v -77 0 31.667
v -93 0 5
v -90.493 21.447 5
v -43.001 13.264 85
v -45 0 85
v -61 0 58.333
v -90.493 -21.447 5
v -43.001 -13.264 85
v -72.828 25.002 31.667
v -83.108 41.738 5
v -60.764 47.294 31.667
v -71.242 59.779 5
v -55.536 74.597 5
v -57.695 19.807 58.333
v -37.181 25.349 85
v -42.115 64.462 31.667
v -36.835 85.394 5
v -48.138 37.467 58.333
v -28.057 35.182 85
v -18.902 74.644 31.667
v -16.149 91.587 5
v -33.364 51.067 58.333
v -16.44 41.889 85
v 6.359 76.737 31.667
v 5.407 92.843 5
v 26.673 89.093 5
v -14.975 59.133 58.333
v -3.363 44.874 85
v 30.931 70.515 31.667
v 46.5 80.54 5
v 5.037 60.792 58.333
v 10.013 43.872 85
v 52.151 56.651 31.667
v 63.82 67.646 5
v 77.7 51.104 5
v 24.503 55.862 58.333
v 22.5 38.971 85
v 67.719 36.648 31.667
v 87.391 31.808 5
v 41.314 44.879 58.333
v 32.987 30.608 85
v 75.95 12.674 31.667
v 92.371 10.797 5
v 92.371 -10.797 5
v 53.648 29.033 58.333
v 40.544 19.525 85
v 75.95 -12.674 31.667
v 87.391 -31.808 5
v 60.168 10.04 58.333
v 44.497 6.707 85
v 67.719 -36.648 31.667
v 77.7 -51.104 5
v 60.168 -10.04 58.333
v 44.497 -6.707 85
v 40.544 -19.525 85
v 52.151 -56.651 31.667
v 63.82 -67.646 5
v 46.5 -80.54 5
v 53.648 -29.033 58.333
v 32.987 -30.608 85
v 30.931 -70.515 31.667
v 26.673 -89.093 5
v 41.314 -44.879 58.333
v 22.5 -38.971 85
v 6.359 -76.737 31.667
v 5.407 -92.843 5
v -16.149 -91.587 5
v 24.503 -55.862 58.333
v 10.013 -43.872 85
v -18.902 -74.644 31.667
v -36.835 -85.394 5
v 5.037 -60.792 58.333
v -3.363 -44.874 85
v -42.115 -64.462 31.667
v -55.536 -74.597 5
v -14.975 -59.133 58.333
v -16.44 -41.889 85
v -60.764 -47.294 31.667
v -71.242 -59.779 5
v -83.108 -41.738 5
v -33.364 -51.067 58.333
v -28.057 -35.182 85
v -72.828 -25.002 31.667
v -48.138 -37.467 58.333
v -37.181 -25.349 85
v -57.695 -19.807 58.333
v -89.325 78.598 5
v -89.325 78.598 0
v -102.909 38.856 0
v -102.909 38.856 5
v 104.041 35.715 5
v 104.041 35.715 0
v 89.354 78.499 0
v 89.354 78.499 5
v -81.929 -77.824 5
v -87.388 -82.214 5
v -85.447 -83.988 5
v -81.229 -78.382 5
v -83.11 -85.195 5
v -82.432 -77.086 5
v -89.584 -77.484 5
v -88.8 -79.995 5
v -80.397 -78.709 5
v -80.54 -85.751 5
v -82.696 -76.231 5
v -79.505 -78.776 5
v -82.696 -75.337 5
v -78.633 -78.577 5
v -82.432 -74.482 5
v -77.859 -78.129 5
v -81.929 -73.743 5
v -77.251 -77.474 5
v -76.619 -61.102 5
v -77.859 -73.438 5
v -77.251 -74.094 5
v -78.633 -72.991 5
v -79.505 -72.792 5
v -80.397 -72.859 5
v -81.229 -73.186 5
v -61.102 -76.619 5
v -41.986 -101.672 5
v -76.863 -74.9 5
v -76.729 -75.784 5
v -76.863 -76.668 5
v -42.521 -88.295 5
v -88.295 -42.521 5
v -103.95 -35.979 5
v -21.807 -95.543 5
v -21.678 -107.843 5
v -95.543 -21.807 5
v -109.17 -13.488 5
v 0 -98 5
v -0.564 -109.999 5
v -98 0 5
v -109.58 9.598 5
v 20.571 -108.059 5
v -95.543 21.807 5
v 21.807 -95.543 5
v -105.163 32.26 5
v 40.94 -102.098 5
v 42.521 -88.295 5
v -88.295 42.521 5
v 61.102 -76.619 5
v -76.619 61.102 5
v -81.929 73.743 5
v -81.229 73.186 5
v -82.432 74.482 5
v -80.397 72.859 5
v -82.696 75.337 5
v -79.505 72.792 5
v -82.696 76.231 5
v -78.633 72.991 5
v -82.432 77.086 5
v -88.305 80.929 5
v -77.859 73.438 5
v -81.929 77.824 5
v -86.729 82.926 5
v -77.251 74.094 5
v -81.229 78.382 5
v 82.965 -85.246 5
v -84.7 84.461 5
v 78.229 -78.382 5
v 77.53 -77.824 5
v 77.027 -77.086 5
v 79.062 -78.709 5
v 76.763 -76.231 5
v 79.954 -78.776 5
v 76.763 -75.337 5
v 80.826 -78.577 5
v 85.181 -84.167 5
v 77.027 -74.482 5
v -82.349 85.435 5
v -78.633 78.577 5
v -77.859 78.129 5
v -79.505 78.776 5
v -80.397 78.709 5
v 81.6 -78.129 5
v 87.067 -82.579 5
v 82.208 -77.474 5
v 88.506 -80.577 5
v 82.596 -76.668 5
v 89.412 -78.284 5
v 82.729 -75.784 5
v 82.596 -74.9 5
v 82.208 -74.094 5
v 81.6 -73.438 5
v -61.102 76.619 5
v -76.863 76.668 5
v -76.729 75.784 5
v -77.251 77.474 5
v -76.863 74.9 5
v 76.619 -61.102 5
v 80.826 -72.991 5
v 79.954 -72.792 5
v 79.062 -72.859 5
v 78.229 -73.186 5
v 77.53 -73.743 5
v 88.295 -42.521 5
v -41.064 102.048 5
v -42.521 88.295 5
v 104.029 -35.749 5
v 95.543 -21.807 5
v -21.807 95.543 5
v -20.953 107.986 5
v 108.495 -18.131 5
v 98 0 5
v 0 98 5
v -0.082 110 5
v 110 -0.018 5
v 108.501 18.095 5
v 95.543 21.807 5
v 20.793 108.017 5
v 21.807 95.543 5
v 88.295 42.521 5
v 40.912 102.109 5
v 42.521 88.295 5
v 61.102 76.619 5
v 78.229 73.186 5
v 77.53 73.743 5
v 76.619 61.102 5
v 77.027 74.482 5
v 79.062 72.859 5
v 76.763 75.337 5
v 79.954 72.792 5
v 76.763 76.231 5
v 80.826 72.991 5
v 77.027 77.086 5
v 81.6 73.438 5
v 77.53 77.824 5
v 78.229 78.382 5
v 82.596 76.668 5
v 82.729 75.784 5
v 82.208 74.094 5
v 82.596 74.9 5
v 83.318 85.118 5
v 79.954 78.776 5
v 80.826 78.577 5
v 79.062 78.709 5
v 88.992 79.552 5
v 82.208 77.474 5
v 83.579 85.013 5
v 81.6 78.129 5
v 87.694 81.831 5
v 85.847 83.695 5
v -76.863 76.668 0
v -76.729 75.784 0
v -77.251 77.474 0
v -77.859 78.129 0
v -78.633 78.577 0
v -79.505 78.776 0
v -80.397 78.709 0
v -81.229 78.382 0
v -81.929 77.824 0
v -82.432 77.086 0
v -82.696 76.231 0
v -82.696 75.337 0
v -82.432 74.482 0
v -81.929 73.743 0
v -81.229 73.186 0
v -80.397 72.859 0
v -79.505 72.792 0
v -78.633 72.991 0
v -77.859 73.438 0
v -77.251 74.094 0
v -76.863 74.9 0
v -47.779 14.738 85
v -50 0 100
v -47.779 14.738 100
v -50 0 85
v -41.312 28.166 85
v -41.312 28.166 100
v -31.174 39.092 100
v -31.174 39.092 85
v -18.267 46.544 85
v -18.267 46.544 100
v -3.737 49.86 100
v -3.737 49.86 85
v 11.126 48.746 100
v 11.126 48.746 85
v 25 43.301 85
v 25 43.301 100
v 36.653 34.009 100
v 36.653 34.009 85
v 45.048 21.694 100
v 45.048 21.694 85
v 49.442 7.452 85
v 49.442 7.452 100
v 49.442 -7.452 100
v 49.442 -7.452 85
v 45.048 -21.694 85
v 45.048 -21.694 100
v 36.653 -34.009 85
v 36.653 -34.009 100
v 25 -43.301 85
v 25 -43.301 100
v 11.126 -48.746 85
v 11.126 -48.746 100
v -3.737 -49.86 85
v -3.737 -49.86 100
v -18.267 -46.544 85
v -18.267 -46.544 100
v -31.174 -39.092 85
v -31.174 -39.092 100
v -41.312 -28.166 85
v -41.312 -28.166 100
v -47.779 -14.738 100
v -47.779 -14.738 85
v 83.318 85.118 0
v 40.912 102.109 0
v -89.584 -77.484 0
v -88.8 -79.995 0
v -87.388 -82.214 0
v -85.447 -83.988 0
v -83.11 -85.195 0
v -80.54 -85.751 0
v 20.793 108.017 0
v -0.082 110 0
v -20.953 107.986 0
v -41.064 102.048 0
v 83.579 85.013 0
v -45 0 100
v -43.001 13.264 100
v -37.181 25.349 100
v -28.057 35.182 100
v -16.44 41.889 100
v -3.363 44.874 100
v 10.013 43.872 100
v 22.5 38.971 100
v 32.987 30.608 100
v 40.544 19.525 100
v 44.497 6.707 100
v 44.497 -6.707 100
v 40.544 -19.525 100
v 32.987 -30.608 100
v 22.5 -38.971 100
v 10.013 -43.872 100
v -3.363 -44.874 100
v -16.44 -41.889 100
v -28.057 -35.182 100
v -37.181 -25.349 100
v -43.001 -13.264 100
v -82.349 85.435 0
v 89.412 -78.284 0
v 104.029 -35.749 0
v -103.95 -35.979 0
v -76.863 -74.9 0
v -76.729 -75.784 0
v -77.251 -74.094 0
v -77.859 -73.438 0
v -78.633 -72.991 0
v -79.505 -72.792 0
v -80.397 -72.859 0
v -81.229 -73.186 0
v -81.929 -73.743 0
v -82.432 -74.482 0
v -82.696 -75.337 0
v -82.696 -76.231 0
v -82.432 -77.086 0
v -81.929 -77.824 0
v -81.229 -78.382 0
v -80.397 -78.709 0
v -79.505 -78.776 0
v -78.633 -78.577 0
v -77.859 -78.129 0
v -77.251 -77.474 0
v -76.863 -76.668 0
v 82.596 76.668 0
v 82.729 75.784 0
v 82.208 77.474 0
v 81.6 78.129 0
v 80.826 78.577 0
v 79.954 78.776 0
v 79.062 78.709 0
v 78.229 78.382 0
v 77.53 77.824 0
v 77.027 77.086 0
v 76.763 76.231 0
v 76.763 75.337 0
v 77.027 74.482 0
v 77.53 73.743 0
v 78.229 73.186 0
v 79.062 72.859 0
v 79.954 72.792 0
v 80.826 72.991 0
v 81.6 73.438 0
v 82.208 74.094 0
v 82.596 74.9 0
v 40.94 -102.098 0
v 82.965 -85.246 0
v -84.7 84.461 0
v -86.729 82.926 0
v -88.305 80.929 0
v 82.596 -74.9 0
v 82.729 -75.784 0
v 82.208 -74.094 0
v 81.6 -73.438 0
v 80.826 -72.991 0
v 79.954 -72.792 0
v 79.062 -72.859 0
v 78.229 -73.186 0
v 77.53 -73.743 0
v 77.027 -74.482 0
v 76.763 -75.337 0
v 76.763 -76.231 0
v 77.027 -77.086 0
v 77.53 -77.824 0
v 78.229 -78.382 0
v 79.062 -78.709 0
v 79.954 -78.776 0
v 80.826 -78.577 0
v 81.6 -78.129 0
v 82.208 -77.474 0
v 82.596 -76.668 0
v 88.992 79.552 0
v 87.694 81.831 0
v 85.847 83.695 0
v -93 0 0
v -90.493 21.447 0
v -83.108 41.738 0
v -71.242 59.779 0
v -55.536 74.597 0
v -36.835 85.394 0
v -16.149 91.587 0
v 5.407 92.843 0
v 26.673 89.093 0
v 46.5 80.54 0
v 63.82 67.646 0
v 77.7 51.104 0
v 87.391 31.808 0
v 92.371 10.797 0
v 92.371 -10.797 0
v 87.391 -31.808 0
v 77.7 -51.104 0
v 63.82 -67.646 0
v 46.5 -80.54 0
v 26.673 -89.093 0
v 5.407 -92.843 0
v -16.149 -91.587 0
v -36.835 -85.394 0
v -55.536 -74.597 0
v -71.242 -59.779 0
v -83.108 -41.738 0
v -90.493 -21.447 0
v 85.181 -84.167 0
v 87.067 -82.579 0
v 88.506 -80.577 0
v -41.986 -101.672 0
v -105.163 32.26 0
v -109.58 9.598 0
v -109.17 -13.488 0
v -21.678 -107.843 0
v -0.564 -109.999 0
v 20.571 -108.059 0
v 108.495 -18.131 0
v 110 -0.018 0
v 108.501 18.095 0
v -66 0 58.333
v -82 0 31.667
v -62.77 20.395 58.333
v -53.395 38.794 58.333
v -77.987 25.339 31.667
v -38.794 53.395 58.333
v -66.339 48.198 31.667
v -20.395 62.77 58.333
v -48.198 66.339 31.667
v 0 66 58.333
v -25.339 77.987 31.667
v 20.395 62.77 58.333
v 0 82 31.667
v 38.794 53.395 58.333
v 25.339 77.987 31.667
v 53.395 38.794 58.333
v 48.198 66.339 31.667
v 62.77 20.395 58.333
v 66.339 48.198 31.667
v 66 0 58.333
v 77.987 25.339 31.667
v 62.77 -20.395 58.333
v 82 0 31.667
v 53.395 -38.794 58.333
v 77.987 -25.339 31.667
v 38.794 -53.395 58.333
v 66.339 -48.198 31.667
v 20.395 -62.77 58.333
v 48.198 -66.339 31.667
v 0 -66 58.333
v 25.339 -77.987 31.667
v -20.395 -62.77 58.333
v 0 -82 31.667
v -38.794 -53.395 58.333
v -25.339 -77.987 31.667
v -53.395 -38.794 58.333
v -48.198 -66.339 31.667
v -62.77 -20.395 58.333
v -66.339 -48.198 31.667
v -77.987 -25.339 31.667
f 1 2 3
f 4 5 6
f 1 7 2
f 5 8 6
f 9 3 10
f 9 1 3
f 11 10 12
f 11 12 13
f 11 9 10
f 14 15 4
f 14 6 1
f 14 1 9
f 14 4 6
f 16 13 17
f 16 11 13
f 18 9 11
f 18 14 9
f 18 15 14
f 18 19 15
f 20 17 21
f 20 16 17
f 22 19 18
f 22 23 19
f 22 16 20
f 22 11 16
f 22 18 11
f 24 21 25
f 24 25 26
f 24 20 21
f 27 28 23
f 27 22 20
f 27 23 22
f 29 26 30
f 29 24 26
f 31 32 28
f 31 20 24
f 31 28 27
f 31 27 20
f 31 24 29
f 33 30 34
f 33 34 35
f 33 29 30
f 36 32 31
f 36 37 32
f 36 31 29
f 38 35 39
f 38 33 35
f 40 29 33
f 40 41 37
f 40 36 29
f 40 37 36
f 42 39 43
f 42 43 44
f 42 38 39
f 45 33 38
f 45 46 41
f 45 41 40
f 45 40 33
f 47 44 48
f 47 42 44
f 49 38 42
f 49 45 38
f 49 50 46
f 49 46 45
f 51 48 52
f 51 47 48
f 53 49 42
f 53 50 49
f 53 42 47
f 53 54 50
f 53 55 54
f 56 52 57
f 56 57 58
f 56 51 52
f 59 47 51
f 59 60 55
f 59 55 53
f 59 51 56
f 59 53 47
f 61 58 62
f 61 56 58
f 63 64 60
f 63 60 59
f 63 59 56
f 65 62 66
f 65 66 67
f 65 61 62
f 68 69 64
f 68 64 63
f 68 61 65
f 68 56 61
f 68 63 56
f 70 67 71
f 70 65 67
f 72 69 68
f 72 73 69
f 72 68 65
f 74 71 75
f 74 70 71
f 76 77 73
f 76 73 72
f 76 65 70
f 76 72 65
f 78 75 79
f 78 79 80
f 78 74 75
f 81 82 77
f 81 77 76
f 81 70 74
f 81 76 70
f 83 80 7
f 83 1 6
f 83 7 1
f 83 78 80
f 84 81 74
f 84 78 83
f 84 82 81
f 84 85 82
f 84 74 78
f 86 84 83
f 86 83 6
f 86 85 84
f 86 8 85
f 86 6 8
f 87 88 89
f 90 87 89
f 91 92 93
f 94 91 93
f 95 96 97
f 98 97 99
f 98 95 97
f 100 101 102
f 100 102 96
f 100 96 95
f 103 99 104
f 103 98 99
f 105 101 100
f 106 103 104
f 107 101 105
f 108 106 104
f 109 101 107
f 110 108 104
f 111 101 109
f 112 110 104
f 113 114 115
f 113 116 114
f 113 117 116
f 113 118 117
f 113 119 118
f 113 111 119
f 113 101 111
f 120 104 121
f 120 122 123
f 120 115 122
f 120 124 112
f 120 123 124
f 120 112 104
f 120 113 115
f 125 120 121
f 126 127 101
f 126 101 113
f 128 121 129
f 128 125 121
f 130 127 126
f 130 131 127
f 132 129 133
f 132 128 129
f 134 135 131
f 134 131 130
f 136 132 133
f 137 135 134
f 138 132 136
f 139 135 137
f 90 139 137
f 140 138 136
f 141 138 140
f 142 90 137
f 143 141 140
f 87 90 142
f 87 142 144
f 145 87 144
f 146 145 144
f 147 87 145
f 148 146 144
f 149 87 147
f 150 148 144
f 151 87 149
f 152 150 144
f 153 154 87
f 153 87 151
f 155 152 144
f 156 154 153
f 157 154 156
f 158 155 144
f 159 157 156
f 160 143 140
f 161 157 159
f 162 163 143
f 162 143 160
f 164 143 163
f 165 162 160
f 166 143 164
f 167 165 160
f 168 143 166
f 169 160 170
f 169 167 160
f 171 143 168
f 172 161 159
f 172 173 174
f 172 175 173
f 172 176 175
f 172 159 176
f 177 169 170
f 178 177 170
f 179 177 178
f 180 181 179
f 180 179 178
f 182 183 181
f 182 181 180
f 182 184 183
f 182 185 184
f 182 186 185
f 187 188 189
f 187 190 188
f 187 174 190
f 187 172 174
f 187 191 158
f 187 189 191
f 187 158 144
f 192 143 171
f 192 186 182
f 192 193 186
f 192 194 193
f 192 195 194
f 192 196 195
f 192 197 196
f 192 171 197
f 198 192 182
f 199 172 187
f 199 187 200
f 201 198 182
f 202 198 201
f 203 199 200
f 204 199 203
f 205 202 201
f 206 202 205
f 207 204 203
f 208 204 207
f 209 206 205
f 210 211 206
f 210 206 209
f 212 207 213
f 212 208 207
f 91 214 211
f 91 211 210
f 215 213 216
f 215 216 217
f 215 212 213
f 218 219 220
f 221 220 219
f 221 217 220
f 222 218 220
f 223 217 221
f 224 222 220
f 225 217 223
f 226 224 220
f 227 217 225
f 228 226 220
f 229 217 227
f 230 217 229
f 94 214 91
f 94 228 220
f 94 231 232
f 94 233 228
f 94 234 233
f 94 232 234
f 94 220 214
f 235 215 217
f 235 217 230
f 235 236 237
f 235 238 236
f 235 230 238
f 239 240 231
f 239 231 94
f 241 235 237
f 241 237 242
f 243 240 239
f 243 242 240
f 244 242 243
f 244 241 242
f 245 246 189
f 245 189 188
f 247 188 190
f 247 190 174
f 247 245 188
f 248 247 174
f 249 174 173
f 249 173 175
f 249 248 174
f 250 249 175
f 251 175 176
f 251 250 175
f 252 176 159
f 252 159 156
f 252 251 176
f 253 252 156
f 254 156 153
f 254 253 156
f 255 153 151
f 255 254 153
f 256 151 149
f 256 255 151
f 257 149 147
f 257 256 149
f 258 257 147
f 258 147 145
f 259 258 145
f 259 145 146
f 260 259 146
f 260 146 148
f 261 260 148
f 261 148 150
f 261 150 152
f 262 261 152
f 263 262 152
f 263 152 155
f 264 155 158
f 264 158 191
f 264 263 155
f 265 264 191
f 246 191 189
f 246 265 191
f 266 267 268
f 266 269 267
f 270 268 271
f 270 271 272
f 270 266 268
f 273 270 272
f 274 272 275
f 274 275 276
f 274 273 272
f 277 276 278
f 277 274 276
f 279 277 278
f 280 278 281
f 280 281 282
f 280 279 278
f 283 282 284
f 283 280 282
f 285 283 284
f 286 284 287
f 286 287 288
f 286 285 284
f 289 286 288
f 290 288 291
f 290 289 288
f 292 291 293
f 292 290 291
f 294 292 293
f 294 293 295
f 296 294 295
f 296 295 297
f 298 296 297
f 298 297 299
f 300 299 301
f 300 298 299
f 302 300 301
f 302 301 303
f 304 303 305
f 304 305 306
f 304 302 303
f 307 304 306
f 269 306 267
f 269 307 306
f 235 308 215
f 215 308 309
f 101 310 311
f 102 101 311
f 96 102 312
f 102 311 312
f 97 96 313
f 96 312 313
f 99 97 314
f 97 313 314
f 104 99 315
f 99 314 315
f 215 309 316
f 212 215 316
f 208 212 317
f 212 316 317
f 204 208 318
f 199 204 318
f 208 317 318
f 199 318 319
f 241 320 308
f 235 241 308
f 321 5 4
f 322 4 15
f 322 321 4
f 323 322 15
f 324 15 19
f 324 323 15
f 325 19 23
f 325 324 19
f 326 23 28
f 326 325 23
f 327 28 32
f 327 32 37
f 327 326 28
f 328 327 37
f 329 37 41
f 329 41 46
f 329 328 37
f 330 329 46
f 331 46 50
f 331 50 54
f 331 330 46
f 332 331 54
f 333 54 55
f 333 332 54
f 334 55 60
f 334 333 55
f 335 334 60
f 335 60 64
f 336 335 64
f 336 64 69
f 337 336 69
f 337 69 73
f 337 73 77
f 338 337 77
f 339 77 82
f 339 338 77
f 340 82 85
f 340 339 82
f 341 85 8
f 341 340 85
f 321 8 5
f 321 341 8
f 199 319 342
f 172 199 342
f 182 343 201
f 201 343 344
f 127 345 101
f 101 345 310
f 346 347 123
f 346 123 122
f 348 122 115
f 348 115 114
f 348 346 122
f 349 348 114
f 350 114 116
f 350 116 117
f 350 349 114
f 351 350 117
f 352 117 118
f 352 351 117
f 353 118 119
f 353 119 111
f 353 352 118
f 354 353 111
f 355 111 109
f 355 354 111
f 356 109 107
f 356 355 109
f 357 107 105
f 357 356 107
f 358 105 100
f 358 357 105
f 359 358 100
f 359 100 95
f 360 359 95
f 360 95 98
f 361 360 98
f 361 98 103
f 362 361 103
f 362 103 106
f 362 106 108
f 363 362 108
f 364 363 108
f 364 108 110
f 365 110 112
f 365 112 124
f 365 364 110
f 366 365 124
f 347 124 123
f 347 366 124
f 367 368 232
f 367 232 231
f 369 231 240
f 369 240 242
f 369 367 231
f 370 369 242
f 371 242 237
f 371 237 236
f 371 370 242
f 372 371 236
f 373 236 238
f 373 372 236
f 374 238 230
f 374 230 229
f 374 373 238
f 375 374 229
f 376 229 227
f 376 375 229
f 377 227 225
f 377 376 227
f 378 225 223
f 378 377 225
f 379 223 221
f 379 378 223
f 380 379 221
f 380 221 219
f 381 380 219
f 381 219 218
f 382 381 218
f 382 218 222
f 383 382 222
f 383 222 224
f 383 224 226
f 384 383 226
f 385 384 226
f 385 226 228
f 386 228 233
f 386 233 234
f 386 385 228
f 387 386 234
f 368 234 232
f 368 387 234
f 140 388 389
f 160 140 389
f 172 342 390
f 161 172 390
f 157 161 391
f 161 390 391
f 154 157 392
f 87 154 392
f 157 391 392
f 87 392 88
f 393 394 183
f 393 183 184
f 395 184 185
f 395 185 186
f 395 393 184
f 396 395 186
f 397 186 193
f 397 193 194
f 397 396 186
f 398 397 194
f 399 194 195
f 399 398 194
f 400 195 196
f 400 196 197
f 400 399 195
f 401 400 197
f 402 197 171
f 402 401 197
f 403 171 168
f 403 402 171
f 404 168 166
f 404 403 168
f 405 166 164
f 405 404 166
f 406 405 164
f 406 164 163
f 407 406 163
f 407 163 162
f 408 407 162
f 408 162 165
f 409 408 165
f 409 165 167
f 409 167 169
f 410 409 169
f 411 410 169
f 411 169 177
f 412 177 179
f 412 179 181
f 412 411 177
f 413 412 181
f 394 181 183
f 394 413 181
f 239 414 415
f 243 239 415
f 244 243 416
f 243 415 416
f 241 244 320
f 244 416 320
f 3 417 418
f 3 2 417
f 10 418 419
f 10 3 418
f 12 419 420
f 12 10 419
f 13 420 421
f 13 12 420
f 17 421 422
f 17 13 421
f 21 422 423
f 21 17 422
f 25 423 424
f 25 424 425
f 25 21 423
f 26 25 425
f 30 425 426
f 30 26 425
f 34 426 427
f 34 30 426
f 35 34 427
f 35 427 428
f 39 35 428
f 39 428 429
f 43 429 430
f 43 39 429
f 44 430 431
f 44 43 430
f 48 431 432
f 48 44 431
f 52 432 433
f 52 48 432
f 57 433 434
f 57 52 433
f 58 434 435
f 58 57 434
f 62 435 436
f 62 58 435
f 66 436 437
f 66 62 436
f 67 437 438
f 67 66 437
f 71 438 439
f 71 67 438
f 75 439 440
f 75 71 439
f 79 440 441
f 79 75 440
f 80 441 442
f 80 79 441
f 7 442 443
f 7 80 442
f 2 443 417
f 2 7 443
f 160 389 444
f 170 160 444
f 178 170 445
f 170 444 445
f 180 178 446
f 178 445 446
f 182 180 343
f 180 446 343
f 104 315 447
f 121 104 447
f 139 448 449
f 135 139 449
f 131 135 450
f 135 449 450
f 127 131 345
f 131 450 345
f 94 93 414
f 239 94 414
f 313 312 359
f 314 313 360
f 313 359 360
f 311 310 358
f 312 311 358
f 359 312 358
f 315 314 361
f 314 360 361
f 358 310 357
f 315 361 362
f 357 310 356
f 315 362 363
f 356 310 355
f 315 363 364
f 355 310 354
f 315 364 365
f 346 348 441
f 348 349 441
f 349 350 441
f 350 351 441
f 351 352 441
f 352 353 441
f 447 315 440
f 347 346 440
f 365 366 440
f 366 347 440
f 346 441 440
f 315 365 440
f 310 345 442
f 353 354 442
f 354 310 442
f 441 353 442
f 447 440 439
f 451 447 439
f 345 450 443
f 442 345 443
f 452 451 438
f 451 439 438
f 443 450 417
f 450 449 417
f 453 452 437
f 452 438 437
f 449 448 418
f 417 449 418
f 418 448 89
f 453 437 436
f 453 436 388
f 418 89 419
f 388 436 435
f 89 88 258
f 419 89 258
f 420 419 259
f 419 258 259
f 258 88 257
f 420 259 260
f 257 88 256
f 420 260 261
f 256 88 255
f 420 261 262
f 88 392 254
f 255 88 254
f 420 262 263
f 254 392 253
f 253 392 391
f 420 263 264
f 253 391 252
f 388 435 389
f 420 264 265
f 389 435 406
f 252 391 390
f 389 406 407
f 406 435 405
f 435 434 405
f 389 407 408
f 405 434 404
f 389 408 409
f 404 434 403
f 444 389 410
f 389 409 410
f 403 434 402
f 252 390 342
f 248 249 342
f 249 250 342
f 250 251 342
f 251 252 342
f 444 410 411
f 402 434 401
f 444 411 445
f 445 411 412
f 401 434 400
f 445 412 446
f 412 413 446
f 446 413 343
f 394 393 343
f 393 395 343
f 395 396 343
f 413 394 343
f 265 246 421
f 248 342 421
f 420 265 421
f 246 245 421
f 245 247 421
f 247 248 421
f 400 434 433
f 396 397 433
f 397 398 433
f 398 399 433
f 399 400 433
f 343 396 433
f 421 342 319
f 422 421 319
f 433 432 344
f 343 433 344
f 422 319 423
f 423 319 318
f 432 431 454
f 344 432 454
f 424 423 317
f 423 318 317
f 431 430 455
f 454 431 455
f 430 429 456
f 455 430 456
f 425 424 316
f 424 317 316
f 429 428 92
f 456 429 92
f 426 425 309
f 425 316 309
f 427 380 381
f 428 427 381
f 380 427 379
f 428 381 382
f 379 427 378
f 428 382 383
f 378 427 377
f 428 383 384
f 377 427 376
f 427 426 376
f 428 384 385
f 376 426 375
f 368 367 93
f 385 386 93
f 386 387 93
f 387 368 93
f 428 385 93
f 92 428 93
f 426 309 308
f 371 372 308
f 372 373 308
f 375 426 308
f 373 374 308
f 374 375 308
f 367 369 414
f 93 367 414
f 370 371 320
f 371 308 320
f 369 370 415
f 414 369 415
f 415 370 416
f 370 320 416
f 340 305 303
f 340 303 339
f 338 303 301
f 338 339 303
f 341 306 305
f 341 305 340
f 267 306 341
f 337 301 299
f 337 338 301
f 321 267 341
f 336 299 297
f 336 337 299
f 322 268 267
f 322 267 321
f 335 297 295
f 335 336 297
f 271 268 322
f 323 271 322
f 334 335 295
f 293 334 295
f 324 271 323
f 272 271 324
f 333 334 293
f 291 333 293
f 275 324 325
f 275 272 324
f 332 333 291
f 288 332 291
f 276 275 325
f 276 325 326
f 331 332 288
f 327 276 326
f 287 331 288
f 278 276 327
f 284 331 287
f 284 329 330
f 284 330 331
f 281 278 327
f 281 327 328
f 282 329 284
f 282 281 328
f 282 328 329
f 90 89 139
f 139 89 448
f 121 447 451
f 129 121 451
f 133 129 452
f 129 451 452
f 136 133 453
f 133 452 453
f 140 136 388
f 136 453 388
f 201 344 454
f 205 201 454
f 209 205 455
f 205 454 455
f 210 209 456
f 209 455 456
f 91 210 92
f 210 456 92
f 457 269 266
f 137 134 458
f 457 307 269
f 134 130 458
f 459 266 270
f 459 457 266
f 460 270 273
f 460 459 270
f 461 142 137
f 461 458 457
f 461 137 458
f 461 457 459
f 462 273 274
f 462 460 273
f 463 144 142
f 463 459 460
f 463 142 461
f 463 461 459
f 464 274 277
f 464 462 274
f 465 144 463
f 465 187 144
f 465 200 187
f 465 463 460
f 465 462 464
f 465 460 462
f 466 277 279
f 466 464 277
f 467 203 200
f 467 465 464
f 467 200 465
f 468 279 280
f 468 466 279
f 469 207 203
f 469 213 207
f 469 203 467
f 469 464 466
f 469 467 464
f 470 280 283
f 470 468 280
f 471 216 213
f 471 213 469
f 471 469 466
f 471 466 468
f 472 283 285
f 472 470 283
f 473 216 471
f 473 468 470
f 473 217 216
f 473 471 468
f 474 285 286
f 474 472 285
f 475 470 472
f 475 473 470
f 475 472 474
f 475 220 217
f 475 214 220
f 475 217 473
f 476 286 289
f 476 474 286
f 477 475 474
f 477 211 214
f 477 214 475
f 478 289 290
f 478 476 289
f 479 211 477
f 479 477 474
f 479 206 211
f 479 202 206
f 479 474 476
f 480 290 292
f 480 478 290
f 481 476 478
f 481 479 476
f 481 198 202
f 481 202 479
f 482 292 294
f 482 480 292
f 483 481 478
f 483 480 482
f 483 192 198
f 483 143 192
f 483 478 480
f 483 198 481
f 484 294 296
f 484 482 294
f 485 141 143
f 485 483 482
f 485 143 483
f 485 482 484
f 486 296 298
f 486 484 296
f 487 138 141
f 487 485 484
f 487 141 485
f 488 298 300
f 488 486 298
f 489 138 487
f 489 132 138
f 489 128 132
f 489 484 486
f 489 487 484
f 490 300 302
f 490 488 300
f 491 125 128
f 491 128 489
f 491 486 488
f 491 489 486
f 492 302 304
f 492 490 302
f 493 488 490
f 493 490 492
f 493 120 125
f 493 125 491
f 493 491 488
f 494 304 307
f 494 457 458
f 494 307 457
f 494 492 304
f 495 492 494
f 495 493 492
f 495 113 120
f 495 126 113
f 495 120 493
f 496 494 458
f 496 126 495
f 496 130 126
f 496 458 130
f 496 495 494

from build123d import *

# Parameters (mm, degrees)
F0_R     = 3
F0_R_2   = 95
F3_DEPTH = 5


with BuildPart() as f2:
    # F1 (on Front) → F2 (revolve)
    with BuildSketch(Plane.XZ):
        Polygon((-98, 5), (-98, 0), (-93, 0), (-93, 5), (-45, 85), (-45, 100), (-50, 100), (-50, 85), align=None)
    revolve(axis=Axis((0, 0, 50), (0, 0, -1)))

    # F0 (on Top) → F3 (join)
    with BuildSketch(Plane.XY):
        with BuildLine():
            Line((-89.325313, 78.598246), (-102.908732, 38.856053))
            Line((-102.908732, 38.856053), (-105.163031, 32.260454))
            ThreePointArc((-105.163031, 32.260454), (-109.982614, -1.955642), (-103.949644, -35.978765))
            Line((-103.949644, -35.978765), (-89.583886, -77.484232))
            ThreePointArc((-89.583886, -77.484232), (-86.476317, -83.165038), (-80.539903, -85.751064))
            Line((-80.539903, -85.751064), (-41.985508, -101.672106))
            ThreePointArc((-41.985508, -101.672106), (-0.564426, -109.998552), (40.939922, -102.097614))
            Line((40.939922, -102.097614), (82.964931, -85.246088))
            ThreePointArc((82.964931, -85.246088), (87.066641, -82.578532), (89.411846, -78.284362))
            Line((89.411846, -78.284362), (104.028902, -35.74895))
            ThreePointArc((104.028902, -35.74895), (109.999998, -0.018173), (104.040709, 35.714576))
            Line((104.040709, 35.714576), (89.353771, 78.499332))
            Line((89.353771, 78.499332), (88.99239, 79.552075))
            ThreePointArc((88.99239, 79.552075), (86.831614, 82.823834), (83.579002, 85.013326))
            Line((83.579002, 85.013326), (83.317816, 85.117976))
            Line((83.317816, 85.117976), (40.912133, 102.108752))
            ThreePointArc((40.912133, 102.108752), (-0.081717, 109.99997), (-41.063798, 102.047854))
            Line((-41.063798, 102.047854), (-82.349187, 85.434718))
            ThreePointArc((-82.349187, 85.434718), (-86.72871, 82.926152), (-89.325313, 78.598246))
        make_face()
        with Locations((-79.729493, -75.783956)):
            Circle(F0_R, mode=Mode.SUBTRACT)
        with Locations((79.729493, -75.783956)):
            Circle(F0_R, mode=Mode.SUBTRACT)
        with Locations((-79.729493, 75.783956)):
            Circle(F0_R, mode=Mode.SUBTRACT)
        Circle(F0_R_2, mode=Mode.SUBTRACT)
        with Locations((79.729493, 75.783956)):
            Circle(F0_R, mode=Mode.SUBTRACT)
    extrude(amount=F3_DEPTH)


solid = f2.part
